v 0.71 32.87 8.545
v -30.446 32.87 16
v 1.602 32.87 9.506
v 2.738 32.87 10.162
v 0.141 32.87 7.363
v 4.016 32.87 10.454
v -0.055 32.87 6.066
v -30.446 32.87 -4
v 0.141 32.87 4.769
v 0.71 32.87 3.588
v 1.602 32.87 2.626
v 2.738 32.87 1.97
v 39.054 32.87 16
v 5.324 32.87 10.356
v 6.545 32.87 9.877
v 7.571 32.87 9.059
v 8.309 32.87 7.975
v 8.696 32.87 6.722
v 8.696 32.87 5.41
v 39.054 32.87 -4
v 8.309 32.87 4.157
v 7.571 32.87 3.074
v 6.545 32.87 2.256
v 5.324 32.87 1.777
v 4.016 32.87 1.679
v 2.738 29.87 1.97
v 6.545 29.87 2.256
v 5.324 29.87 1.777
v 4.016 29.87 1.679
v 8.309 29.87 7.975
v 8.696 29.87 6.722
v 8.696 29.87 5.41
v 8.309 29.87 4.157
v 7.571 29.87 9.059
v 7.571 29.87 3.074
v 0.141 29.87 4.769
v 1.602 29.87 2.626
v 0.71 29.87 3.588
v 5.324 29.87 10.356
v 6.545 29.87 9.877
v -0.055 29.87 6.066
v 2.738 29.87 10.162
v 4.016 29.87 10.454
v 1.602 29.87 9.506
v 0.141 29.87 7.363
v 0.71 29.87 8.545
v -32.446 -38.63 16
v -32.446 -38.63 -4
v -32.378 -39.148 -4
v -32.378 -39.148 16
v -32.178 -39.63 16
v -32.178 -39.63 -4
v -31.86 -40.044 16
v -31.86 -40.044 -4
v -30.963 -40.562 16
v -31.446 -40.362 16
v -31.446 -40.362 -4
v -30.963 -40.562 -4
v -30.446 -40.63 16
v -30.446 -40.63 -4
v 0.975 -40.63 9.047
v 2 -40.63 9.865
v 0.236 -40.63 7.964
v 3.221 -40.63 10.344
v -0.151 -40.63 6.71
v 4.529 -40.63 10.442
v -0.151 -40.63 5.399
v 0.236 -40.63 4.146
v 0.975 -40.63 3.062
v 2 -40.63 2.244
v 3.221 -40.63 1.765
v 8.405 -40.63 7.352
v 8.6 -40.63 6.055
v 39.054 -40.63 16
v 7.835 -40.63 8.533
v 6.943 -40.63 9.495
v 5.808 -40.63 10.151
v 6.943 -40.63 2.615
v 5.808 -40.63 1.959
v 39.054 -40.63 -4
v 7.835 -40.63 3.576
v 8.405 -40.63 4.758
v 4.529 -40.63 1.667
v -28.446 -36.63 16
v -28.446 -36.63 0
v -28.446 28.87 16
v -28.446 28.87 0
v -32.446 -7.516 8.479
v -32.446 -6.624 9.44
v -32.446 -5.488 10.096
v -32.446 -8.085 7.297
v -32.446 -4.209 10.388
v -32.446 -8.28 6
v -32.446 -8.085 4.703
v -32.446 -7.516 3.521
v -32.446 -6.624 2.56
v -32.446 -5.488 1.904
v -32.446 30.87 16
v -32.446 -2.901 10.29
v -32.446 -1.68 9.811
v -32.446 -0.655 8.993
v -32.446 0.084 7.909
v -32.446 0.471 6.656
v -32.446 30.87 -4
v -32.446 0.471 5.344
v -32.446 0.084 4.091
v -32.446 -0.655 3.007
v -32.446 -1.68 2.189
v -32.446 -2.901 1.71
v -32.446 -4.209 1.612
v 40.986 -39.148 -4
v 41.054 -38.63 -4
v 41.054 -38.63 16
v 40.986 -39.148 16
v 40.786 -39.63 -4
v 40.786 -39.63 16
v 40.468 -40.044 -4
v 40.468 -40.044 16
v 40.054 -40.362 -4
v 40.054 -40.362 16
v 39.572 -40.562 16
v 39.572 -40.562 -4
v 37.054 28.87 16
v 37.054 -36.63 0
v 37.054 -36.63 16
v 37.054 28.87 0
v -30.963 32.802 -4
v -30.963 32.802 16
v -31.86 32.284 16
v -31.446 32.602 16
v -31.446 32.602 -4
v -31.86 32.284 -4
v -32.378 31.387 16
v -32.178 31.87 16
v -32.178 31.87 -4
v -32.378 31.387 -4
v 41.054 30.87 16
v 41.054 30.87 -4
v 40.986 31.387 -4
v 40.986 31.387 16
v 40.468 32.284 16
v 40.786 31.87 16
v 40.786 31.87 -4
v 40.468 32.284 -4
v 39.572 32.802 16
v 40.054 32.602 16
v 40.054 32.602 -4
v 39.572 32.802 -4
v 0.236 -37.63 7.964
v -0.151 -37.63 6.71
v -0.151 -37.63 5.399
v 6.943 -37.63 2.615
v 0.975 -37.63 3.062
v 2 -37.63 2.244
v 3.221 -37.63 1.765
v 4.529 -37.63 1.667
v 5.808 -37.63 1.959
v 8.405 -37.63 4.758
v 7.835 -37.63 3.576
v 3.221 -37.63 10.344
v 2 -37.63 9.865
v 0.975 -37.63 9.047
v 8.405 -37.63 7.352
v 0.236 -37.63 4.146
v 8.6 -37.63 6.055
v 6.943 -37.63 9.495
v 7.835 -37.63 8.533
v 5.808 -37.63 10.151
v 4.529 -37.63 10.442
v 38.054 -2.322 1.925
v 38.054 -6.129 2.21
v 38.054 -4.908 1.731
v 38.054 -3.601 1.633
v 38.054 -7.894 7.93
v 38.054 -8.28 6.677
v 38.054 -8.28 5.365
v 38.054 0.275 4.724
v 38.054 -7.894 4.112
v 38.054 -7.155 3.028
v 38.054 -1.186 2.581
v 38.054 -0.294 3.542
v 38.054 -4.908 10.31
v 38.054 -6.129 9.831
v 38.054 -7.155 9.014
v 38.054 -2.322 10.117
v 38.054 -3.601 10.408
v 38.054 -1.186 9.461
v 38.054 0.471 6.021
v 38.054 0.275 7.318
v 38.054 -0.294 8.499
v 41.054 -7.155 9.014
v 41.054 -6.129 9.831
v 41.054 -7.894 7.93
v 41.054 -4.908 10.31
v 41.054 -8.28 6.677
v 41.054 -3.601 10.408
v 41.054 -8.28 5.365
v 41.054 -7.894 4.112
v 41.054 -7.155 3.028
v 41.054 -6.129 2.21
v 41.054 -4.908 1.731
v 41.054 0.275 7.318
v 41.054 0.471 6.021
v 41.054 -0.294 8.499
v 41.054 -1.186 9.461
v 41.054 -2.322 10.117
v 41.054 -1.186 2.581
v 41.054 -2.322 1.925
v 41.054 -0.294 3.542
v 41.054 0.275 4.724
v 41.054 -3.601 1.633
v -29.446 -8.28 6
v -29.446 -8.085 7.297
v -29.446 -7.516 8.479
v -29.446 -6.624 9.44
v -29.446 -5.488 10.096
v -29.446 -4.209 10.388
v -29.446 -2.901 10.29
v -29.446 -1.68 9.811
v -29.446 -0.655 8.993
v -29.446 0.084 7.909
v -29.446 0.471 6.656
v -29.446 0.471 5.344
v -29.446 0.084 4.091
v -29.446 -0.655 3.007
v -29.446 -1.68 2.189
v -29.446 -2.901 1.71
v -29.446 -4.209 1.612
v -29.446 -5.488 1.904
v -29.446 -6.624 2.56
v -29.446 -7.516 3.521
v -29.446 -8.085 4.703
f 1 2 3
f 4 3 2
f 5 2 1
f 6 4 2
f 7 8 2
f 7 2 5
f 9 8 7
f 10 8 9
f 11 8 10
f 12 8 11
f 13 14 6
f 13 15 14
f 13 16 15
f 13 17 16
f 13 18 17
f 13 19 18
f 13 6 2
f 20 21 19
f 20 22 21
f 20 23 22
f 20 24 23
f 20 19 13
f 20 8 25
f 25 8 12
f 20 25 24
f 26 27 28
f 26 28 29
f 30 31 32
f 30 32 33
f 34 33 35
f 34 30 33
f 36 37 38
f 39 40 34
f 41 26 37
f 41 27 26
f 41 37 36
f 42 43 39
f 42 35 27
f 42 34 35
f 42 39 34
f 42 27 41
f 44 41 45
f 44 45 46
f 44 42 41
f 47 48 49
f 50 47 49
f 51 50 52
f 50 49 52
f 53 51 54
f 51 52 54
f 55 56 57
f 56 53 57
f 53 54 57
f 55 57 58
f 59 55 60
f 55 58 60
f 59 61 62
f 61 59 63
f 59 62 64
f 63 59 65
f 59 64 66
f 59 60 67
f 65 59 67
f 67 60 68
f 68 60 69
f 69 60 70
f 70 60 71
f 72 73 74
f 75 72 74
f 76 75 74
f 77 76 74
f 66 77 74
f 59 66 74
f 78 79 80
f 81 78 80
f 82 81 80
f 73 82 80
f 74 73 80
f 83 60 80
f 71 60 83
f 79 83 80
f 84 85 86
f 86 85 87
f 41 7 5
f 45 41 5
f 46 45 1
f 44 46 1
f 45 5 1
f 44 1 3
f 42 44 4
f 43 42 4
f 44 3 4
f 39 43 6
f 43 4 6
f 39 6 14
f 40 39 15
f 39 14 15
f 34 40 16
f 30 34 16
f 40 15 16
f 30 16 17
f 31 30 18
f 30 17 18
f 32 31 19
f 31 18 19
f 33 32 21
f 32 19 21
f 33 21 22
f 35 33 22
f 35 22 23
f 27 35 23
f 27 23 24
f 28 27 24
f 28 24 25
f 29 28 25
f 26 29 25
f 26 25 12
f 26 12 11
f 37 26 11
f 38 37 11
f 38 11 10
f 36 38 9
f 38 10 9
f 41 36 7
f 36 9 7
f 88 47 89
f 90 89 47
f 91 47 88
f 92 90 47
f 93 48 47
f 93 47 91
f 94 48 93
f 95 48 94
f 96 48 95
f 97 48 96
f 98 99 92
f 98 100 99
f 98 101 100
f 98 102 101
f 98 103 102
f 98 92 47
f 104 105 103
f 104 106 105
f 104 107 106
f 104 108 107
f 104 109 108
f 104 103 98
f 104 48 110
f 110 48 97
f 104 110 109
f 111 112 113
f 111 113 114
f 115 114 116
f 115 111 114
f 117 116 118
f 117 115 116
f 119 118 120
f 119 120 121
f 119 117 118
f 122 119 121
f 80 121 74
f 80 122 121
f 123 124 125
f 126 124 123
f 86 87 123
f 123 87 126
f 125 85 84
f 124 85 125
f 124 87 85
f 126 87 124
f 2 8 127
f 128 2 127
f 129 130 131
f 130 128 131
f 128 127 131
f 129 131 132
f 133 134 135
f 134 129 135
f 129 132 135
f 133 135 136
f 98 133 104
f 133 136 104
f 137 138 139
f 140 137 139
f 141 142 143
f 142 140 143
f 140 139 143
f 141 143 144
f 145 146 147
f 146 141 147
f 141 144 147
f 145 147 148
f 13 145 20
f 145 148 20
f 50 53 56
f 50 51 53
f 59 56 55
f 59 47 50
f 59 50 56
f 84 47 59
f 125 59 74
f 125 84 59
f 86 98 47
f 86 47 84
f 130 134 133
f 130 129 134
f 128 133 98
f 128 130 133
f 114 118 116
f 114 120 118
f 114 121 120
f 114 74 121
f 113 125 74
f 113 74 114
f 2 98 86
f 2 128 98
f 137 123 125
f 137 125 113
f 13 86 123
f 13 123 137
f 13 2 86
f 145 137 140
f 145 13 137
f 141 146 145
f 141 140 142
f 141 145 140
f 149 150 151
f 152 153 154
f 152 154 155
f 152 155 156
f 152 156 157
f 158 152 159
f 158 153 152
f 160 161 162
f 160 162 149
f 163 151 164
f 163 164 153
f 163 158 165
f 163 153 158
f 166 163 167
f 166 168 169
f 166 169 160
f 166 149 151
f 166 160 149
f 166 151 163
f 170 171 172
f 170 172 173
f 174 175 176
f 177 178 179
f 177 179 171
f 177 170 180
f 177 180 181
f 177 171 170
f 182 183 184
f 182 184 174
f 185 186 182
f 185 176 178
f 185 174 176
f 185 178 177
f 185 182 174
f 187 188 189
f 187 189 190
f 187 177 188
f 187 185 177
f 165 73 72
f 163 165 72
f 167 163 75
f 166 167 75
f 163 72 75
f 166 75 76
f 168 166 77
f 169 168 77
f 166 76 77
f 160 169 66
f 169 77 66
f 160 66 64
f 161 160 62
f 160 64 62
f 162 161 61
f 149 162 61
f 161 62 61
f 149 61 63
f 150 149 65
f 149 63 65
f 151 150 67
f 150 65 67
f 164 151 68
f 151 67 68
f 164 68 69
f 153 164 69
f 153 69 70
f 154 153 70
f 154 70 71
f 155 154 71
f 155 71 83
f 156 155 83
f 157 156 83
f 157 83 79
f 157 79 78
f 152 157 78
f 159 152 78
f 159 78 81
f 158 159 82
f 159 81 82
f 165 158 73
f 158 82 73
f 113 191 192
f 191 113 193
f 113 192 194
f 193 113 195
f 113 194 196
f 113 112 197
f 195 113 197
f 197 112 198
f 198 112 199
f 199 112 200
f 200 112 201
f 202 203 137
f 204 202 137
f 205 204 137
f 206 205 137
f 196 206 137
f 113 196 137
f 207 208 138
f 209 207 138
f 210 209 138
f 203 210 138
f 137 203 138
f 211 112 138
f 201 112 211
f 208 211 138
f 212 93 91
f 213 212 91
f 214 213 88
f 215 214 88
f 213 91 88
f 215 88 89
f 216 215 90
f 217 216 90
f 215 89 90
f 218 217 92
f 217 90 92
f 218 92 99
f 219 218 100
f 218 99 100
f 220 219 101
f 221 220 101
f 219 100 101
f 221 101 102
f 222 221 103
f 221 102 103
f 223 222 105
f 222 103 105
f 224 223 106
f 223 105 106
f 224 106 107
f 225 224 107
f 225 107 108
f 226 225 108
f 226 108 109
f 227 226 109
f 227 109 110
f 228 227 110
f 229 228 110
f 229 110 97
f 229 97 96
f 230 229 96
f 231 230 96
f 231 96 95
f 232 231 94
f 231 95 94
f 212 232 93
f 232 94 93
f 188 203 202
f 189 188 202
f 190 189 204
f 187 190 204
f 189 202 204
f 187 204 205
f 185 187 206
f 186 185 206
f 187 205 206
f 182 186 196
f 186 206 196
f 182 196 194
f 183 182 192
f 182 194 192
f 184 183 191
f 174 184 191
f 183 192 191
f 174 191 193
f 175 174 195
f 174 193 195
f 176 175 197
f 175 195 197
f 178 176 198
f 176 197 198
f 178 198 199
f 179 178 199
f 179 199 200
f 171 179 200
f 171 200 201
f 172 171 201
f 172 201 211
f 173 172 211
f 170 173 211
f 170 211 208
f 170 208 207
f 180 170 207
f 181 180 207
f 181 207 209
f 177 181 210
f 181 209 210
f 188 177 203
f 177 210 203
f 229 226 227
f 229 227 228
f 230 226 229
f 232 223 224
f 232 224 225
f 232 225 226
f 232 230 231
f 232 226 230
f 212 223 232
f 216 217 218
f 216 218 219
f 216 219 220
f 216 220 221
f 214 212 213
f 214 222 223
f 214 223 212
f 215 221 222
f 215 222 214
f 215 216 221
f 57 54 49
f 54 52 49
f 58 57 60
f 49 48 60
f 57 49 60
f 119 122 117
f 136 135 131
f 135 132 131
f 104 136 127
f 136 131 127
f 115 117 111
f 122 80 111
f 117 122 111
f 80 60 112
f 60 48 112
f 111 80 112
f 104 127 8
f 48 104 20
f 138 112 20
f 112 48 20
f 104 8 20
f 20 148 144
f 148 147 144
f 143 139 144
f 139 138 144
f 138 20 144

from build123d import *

# Parameters (mm, degrees)
F0_W        = 65.5
F0_H        = 65.5
F1_DEPTH    = 16
F2_T        = 4
F3_T1_DEPTH = 30
F4_R        = 4.4
F8_DEPTH    = 3
F9_DEPTH    = 3
F5_R        = 4.4
F10_DEPTH   = 3
F6_R        = 4.4
F11_DEPTH   = 3
F7_R        = 4.4
F12_DEPTH   = 3


# Not quite as in the source:
# - a fillet or chamfer that OpenCascade refuses, or shapes differently, is made with other operations: its cross-section is extruded or revolved along the edge and cut away or added


with BuildPart() as f1:
    # F0 (on Top) → F1 (new body)
    with BuildSketch(Plane.XY):
        with Locations((4.3041806072, -3.8802318871)):
            Rectangle(F0_W, F0_H)
    extrude(amount=F1_DEPTH)

    # F2
    f2_openings = [f1.faces().sort_by_distance(p)[0] for p in [
        (4.304181, -3.880232, 16),
    ]]
    offset(amount=F2_T, openings=f2_openings, kind=Kind.INTERSECTION)

    # F3: fillet of radius 2 on 4 edges, made by hand

    # F3_s2 → F3_t1 (cut)
    with BuildSketch(Plane.XY.offset(-9)):
        with BuildLine():
            ThreePointArc((41.0541806072, -38.6302318871), (40.4683941696, -40.0444454495), (39.0541806072, -40.6302318871))
            Line((39.0541806072, -40.6302318871), (41.0541806072, -40.6302318871))
            Line((41.0541806072, -40.6302318871), (41.0541806072, -38.6302318871))
        make_face()
        with BuildLine():
            ThreePointArc((41.0541806072, 30.8697681129), (40.4683941696, 32.2839816753), (39.0541806072, 32.8697681129))
            Line((39.0541806072, 32.8697681129), (41.0541806072, 32.8697681129))
            Line((41.0541806072, 32.8697681129), (41.0541806072, 30.8697681129))
        make_face()
        with BuildLine():
            ThreePointArc((-30.4458193928, 32.8697681129), (-31.8600329552, 32.2839816753), (-32.4458193928, 30.8697681129))
            Line((-32.4458193928, 30.8697681129), (-32.4458193928, 32.8697681129))
            Line((-32.4458193928, 32.8697681129), (-30.4458193928, 32.8697681129))
        make_face()
        with BuildLine():
            ThreePointArc((-32.4458193928, -38.6302318871), (-31.8600329552, -40.0444454495), (-30.4458193928, -40.6302318871))
            Line((-30.4458193928, -40.6302318871), (-32.4458193928, -40.6302318871))
            Line((-32.4458193928, -40.6302318871), (-32.4458193928, -38.6302318871))
        make_face()
    extrude(amount=F3_T1_DEPTH, mode=Mode.SUBTRACT)

    # F4 (on face) → F8 (join)
    with BuildSketch(Plane(origin=(-32.4458193928, 0, 0), x_dir=(0, -1, 0), z_dir=(-1, 0, 0))):
        with Locations((3.8802318871, 6)):
            Circle(F4_R)
    extrude(amount=-F8_DEPTH)

    # F4 (on face) → F9 (cut)
    with BuildSketch(Plane(origin=(-32.4458193928, 0, 0), x_dir=(0, -1, 0), z_dir=(-1, 0, 0))):
        with Locations((3.8802318871, 6)):
            Circle(F4_R)
    extrude(amount=-F9_DEPTH, mode=Mode.SUBTRACT)

    # F5 (on face) → F10 (cut)
    with BuildSketch(Plane.XZ.offset(40.6302318871)):
        with Locations((4.2000180173, 6.0547004089)):
            Circle(F5_R)
    extrude(amount=-F10_DEPTH, mode=Mode.SUBTRACT)

    # F6 (on face) → F11 (cut)
    with BuildSketch(Plane.YZ.offset(41.0541806072)):
        with Locations((-3.9293510383, 6.0207889489)):
            Circle(F6_R)
    extrude(amount=-F11_DEPTH, mode=Mode.SUBTRACT)

    # F7 (on face) → F12 (cut)
    with BuildSketch(Plane(origin=(0, 32.8697681129, 0), x_dir=(-1, 0, 0), z_dir=(0, 1, 0))):
        with Locations((-4.345219037, 6.0662772571)):
            Circle(F7_R)
    extrude(amount=-F12_DEPTH, mode=Mode.SUBTRACT)


solid = f1.part
